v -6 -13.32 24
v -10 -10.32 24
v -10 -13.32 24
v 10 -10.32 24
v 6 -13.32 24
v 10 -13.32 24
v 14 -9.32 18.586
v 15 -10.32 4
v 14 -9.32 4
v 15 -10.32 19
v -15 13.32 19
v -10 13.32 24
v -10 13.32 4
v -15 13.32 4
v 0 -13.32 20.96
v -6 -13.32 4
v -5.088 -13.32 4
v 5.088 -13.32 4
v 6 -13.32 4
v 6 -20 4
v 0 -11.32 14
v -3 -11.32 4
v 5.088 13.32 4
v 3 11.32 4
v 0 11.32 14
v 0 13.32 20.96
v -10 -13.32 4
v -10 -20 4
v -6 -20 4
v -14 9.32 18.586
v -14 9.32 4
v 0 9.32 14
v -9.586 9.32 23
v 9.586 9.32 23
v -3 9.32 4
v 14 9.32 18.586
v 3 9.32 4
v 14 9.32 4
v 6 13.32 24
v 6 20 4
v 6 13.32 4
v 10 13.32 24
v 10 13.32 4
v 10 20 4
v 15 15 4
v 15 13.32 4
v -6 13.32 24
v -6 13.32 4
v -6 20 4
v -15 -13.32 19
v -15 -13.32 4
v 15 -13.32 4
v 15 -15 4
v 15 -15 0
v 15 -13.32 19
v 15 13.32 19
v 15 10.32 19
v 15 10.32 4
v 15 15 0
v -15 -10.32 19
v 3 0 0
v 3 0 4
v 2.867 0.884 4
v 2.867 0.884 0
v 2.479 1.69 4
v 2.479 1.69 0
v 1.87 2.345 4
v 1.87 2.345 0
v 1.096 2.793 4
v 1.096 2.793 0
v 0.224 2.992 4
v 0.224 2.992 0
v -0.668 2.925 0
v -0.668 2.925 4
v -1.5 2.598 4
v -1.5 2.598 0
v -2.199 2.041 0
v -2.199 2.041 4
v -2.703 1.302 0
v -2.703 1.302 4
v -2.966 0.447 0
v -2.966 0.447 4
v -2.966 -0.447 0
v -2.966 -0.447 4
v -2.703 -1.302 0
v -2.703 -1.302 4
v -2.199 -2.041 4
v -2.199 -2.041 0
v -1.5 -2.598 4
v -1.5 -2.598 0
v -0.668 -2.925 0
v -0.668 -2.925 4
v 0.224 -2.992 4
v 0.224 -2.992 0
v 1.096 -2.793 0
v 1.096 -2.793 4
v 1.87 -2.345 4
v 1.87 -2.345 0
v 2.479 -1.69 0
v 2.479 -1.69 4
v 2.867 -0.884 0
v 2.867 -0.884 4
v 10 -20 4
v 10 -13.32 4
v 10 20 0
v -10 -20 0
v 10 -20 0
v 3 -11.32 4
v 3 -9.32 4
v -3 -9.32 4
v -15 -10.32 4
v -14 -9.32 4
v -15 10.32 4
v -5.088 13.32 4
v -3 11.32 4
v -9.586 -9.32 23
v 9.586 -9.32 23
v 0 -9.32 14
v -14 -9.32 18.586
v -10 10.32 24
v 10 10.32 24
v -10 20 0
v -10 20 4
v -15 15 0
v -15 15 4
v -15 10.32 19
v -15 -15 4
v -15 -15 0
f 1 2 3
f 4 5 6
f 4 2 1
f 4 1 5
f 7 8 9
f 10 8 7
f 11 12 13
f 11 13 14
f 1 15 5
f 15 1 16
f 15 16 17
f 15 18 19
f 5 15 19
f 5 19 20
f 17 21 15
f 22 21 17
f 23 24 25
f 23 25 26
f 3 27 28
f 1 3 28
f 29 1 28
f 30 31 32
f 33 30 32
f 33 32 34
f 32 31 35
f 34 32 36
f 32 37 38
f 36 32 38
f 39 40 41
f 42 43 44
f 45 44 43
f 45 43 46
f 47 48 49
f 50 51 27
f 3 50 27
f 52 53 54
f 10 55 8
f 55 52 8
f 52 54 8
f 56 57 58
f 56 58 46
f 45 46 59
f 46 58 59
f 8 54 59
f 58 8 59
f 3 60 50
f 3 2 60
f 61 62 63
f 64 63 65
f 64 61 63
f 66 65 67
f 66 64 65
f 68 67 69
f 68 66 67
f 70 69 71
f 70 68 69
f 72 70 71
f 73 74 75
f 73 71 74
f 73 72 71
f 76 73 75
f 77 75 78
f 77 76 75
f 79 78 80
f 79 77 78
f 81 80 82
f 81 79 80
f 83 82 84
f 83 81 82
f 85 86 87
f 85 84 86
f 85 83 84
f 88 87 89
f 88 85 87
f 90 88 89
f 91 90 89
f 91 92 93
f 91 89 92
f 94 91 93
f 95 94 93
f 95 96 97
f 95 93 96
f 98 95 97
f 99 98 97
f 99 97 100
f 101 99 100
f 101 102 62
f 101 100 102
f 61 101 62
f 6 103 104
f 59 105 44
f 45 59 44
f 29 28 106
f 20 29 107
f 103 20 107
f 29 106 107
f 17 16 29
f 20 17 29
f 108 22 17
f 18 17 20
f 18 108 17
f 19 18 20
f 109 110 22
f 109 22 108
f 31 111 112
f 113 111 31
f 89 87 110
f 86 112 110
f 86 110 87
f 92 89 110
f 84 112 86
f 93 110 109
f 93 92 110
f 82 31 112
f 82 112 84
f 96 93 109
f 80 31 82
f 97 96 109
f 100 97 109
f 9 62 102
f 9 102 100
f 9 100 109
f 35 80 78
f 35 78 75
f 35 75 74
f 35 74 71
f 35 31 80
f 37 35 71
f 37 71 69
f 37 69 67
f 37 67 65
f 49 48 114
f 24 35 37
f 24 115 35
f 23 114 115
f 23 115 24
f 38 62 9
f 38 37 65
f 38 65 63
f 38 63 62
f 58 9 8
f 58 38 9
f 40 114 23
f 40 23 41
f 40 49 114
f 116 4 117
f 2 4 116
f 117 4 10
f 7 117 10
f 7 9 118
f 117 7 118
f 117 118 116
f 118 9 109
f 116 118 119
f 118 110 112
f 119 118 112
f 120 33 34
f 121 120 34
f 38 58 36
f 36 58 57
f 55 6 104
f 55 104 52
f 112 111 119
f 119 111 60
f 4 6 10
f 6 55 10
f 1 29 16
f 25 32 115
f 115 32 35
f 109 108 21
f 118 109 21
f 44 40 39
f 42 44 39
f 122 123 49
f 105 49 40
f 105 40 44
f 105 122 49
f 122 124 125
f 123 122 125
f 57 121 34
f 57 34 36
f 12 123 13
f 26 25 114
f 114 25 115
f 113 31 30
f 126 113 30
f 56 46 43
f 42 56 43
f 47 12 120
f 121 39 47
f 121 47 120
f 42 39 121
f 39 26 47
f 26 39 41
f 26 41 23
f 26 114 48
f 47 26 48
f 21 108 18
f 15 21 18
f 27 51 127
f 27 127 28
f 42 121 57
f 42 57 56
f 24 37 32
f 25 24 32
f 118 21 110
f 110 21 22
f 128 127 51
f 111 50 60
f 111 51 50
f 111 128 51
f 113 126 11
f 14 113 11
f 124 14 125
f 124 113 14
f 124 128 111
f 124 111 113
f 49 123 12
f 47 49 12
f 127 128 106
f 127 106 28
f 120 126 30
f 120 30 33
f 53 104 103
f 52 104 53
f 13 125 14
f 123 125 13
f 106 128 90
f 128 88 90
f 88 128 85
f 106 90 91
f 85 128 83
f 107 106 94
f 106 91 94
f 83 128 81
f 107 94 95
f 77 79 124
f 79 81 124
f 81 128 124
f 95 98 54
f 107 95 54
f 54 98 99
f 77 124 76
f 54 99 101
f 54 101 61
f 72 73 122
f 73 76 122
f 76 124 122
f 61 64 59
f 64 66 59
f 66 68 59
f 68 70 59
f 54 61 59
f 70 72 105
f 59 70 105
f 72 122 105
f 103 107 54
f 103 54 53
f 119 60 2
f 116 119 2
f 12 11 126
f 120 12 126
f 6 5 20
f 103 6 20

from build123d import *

# Parameters (mm, degrees)
F0_W     = 30
F0_H     = 40
F0_R     = 3
F1_DEPTH = 4
F3_DEPTH = 20
F5_DEPTH = 30.001
F6_SIZE  = 5
F8_DEPTH = 33.321
F9_SIZE2 = 2
F9_SIZE  = 2
F10_SIZE = 1


with BuildPart() as f1:
    # F0 (on Top) → F1 (new body)
    with BuildSketch(Plane.XY):
        Rectangle(F0_W, F0_H)
        Circle(F0_R, mode=Mode.SUBTRACT)
    extrude(amount=F1_DEPTH)

    # F2 (on face) → F3 (join)
    with BuildSketch(Plane.XY.offset(4)):
        Polygon((-15, 9.32), (15, 9.32), (15, 13.32), (10, 13.32), (10, 20), (6, 20), (6, 13.32), (-6, 13.32), (-6, 20), (-10, 20), (-10, 13.32), (-15, 13.32), align=None)
        Polygon((15, -13.32), (15, -9.32), (-15, -9.32), (-15, -13.32), (-10, -13.32), (-10, -20), (-6, -20), (-6, -13.32), (6, -13.32), (6, -20), (10, -20), (10, -13.32), align=None)
    extrude(amount=F3_DEPTH)

    # F4 (on face) → F5 (cut, through all)
    with BuildSketch(Plane(origin=(-15, 0, 0), x_dir=(0, -1, 0), z_dir=(-1, 0, 0))):
        Polygon((-20, 24), (-20, 4), (-13.32, 24), align=None)
        Polygon((20, 24), (13.32, 24), (20, 4), align=None)
    extrude(amount=-F5_DEPTH, mode=Mode.SUBTRACT)

    # F6
    f6_edges = [f1.edges().sort_by_distance(p)[0] for p in [
        (-15, 20, 2),
        (-15, -20, 2),
        (15, 20, 2),
        (15, -20, 2),
        (-15, 11.32, 24),
        (-15, -11.32, 24),
        (15, -11.32, 24),
        (15, 11.32, 24),
    ]]
    chamfer(f6_edges, length=F6_SIZE)

    # F7 (on face) → F8 (cut, through all)
    with BuildSketch(Plane.XZ.offset(13.32)):
        Polygon((0, 14), (-3, 4), (3, 4), align=None)
    extrude(amount=-F8_DEPTH, mode=Mode.SUBTRACT)

    # F9
    f9_edges = [f1.edges().sort_by_distance(p)[0] for p in [
        (-1.5, -13.32, 9),
        (1.5, -13.32, 9),
        (1.5, 13.32, 9),
        (-1.5, 13.32, 9),
    ]]
    chamfer(f9_edges, length=F9_SIZE, length2=F9_SIZE2)

    # F10
    f10_edges = [f1.edges().sort_by_distance(p)[0] for p in [
        (15, -9.32, 11.5),
        (12.5, -9.32, 21.5),
        (0, -9.32, 24),
        (-15, -9.32, 11.5),
        (-12.5, -9.32, 21.5),
        (-15, 9.32, 11.5),
        (-12.5, 9.32, 21.5),
        (0, 9.32, 24),
        (12.5, 9.32, 21.5),
        (15, 9.32, 11.5),
    ]]
    chamfer(f10_edges, length=F10_SIZE)


solid = f1.part
